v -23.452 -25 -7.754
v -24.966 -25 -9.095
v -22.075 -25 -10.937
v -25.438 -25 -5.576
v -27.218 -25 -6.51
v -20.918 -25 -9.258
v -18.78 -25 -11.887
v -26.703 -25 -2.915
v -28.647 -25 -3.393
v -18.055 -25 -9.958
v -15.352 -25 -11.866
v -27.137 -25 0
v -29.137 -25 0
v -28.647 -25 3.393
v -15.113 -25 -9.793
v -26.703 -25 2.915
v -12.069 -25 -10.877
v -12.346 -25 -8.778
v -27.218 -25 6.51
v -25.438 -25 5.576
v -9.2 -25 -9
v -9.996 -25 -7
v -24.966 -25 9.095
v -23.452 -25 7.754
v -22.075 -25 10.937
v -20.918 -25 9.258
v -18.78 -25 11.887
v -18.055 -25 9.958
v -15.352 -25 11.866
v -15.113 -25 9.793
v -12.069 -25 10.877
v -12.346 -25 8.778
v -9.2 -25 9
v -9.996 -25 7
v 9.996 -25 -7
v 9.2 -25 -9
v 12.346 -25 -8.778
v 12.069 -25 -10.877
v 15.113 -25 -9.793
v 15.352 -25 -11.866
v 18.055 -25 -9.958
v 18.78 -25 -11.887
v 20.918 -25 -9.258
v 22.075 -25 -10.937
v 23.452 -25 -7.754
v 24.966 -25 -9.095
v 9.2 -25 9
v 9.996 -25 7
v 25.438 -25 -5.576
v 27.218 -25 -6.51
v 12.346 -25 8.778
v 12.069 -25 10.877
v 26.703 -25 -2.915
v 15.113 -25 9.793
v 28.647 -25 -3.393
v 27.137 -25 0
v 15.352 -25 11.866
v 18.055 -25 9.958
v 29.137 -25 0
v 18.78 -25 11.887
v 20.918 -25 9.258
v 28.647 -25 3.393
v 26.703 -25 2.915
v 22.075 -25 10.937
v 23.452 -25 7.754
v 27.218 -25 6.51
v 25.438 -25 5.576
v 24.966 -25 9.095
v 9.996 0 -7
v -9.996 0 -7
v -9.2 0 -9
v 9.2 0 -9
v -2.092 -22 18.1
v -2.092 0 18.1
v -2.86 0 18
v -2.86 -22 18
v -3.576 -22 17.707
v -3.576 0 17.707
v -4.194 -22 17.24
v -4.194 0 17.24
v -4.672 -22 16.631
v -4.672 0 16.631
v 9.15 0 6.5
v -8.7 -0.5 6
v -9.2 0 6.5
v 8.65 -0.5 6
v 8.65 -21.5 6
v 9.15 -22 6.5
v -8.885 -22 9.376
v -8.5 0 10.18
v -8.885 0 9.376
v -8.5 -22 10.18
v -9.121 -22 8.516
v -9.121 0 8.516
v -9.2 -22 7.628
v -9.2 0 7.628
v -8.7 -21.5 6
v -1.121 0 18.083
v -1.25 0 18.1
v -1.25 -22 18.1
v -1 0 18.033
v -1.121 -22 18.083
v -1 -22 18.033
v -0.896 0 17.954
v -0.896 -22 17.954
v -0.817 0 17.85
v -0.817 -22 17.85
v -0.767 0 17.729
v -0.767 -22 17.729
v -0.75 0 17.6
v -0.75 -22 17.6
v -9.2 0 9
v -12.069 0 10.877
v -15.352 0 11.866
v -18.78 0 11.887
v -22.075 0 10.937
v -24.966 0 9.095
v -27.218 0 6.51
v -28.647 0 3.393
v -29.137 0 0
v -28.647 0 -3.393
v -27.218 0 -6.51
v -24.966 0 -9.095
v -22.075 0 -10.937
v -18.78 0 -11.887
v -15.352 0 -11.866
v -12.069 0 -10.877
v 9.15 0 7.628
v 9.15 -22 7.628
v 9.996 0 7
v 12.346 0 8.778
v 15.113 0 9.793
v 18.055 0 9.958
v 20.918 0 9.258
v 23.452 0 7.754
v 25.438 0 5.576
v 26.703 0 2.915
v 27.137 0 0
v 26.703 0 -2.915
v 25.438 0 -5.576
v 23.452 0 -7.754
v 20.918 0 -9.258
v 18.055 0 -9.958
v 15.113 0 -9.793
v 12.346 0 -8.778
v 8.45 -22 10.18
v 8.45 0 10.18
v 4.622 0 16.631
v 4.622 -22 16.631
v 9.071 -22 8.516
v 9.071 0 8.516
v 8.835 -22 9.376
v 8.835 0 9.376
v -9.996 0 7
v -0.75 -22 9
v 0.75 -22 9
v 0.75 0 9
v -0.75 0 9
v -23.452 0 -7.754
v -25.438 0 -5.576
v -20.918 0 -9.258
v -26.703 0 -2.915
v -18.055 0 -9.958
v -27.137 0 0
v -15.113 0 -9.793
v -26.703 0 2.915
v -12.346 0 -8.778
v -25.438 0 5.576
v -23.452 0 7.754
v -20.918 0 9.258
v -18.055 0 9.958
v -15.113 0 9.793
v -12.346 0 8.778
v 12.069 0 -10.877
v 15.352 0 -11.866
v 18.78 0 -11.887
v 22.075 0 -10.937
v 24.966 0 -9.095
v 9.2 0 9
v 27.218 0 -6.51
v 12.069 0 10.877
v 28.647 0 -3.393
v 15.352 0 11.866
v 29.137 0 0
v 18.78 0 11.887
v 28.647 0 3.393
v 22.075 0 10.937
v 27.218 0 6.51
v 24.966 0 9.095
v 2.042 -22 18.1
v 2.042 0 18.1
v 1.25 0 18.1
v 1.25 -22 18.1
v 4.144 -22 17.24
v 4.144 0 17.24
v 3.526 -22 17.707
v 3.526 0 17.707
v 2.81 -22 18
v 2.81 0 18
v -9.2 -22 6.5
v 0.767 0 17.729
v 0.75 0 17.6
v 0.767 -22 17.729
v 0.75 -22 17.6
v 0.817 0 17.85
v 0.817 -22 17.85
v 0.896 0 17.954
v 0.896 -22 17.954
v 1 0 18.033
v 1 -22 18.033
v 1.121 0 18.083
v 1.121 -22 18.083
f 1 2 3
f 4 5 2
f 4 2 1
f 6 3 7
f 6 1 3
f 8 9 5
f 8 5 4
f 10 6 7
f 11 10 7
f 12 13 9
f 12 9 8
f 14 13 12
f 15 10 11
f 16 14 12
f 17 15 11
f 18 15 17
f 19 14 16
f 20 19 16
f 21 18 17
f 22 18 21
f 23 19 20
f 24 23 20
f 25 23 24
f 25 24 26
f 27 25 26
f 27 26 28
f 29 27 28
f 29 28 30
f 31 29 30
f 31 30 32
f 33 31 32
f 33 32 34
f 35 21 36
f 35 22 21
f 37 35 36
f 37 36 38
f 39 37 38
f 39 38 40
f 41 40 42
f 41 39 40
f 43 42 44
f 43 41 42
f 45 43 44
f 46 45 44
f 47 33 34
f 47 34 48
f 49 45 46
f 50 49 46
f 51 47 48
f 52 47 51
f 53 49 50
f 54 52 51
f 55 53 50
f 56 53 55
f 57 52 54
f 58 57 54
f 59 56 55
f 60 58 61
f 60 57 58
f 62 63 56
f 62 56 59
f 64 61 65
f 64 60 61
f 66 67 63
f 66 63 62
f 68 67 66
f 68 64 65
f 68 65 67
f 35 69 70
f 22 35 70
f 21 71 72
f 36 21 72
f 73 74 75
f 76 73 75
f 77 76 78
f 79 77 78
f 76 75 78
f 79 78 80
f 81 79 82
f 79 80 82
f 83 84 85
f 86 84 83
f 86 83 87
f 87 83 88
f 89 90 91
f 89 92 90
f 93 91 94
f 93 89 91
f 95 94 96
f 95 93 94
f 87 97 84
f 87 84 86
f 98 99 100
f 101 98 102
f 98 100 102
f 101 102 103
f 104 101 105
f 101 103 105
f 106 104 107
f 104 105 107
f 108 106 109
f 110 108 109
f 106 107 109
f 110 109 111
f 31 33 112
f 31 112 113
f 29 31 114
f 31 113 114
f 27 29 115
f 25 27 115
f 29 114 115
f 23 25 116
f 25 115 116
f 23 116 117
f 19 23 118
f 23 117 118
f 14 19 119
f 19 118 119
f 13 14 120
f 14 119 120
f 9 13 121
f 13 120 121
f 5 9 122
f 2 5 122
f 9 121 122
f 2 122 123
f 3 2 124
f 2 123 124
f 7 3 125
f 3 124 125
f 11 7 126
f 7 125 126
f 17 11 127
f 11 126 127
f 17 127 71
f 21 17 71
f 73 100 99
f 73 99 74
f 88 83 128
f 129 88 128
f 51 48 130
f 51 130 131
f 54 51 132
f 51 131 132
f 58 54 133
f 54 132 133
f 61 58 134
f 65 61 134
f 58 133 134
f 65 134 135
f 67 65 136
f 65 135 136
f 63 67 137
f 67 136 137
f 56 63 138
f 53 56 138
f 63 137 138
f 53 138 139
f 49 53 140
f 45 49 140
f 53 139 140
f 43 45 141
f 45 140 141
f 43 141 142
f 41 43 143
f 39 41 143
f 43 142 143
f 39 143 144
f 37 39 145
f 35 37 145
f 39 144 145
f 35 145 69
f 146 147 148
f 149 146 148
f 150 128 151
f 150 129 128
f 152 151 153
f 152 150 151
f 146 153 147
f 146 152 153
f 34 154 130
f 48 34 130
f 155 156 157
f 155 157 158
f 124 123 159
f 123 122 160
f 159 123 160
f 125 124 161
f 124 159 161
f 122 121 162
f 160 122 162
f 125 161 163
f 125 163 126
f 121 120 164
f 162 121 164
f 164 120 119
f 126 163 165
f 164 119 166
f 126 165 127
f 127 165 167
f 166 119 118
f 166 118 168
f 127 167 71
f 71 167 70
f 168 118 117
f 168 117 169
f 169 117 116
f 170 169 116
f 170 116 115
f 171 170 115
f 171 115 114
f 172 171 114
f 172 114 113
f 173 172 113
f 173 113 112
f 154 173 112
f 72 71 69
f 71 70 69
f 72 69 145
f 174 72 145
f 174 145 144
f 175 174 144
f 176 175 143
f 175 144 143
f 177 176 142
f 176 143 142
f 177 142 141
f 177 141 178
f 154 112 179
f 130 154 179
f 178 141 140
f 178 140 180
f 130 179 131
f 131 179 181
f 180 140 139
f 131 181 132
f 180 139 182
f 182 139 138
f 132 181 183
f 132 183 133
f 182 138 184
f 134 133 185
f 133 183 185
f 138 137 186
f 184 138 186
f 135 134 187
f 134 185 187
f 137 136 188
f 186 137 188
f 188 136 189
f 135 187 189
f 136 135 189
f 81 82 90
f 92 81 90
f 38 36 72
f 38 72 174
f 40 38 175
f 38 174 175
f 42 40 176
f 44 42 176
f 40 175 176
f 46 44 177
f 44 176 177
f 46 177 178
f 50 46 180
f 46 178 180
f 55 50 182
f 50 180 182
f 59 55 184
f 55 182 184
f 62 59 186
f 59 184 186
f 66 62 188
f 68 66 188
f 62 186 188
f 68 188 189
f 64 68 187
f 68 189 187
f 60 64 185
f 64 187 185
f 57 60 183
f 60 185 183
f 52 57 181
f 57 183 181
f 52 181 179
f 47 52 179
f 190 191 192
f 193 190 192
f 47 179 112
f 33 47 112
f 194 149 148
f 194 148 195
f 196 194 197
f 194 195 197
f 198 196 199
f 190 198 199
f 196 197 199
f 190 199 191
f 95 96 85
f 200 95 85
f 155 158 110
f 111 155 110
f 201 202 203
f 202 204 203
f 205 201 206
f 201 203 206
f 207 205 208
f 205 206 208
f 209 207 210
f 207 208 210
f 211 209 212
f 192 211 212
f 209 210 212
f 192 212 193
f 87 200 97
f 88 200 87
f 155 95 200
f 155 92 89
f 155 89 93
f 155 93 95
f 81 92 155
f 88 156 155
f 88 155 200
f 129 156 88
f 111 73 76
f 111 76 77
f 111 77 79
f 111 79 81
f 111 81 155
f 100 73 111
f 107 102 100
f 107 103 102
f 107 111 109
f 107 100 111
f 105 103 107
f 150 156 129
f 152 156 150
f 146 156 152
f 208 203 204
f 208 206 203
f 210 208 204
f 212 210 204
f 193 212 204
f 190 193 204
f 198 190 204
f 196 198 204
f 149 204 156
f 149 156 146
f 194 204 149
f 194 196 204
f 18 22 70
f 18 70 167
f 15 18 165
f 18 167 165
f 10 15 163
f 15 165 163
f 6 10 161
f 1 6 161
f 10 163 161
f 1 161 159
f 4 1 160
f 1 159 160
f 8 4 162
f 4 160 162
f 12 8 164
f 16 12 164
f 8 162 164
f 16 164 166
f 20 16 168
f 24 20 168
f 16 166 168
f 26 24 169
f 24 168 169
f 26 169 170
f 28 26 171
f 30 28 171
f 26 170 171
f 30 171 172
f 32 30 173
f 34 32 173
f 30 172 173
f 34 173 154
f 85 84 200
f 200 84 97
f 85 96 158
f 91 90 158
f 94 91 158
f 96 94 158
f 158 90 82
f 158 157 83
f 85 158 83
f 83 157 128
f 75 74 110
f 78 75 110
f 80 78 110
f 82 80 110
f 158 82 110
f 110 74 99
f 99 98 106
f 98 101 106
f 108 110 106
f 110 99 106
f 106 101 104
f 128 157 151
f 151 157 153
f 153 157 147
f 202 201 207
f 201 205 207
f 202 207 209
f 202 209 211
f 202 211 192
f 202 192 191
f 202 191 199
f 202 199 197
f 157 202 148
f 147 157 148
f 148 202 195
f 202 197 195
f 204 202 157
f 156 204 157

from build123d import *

# Parameters (mm, degrees)
F2_DEPTH = 25
F4_DEPTH = 22
F5_R     = 5
F6_R     = 0.5
F7_SIZE  = 0.5


# Not quite as in the source:
# - a feature of the source that left no trace in its solid (it failed there, or was rolled back) is left out


with BuildPart() as f2:
    # F1 (on Front) → F2 (new body)
    with BuildSketch(Plane.XZ):
        with BuildLine():
            Line((-0.75, 9), (-9.2, 9))
            ThreePointArc((-9.2, 9), (-29.1372539332, 0), (-9.2, -9))
            Line((-9.2, -9), (9.2, -9))
            ThreePointArc((9.2, -9), (29.1372539332, 0), (9.2, 9))
            Line((9.2, 9), (9.15, 9))
            Line((9.15, 9), (0.75, 9))
            Line((0.75, 9), (-0.75, 9))
        make_face()
        with BuildLine():
            Line((9.9958255047, -7), (-9.9958255047, -7))
            ThreePointArc((-9.9958255047, -7), (-27.1372539332, 0), (-9.9958255047, 7))
            Line((-9.9958255047, 7), (9.9958255047, 7))
            ThreePointArc((9.9958255047, 7), (27.1372539332, 0), (9.9958255047, -7))
        make_face(mode=Mode.SUBTRACT)
    extrude(amount=F2_DEPTH)


with BuildPart() as f4:
    # F3 (on Front) → F4 (new body)
    with BuildSketch(Plane.XZ):
        with BuildLine():
            Line((-0.75, 18.1), (-2.0917842475, 18.1))
            ThreePointArc((-2.0917842475, 18.1), (-3.576222945, 17.7069986101), (-4.6717373284, 16.6309611689))
            Line((-4.6717373284, 16.6309611689), (-9.2, 9))
            Line((-9.2, 9), (-9.2, 6))
            Line((-9.2, 6), (9.15, 6))
            Line((9.15, 6), (9.15, 9))
            Line((9.15, 9), (4.6217373284, 16.6309611689))
            ThreePointArc((4.6217373284, 16.6309611689), (3.526222945, 17.7069986101), (2.0417842475, 18.1))
            Line((2.0417842475, 18.1), (0.75, 18.1))
            Line((0.75, 18.1), (0.75, 9))
            Line((0.75, 9), (-0.75, 9))
            Line((-0.75, 9), (-0.75, 18.1))
        make_face()
    extrude(amount=F4_DEPTH)

    # F5
    f5_edges = [f4.edges().sort_by_distance(p)[0] for p in [
        (9.15, -11, 9),
        (-9.2, -11, 9),
    ]]
    fillet(f5_edges, radius=F5_R)

    # F6
    f6_edges = [f4.edges().sort_by_distance(p)[0] for p in [
        (-0.75, -11, 18.1),
        (0.75, -11, 18.1),
    ]]
    fillet(f6_edges, radius=F6_R)

    # F7
    f7_edges = [f4.edges().sort_by_distance(p)[0] for p in [
        (-9.2, -11, 6),
        (9.15, -11, 6),
        (-0.025, 0, 6),
        (-0.025, -22, 6),
    ]]
    chamfer(f7_edges, length=F7_SIZE)


solid = Compound([f2.part, f4.part])
